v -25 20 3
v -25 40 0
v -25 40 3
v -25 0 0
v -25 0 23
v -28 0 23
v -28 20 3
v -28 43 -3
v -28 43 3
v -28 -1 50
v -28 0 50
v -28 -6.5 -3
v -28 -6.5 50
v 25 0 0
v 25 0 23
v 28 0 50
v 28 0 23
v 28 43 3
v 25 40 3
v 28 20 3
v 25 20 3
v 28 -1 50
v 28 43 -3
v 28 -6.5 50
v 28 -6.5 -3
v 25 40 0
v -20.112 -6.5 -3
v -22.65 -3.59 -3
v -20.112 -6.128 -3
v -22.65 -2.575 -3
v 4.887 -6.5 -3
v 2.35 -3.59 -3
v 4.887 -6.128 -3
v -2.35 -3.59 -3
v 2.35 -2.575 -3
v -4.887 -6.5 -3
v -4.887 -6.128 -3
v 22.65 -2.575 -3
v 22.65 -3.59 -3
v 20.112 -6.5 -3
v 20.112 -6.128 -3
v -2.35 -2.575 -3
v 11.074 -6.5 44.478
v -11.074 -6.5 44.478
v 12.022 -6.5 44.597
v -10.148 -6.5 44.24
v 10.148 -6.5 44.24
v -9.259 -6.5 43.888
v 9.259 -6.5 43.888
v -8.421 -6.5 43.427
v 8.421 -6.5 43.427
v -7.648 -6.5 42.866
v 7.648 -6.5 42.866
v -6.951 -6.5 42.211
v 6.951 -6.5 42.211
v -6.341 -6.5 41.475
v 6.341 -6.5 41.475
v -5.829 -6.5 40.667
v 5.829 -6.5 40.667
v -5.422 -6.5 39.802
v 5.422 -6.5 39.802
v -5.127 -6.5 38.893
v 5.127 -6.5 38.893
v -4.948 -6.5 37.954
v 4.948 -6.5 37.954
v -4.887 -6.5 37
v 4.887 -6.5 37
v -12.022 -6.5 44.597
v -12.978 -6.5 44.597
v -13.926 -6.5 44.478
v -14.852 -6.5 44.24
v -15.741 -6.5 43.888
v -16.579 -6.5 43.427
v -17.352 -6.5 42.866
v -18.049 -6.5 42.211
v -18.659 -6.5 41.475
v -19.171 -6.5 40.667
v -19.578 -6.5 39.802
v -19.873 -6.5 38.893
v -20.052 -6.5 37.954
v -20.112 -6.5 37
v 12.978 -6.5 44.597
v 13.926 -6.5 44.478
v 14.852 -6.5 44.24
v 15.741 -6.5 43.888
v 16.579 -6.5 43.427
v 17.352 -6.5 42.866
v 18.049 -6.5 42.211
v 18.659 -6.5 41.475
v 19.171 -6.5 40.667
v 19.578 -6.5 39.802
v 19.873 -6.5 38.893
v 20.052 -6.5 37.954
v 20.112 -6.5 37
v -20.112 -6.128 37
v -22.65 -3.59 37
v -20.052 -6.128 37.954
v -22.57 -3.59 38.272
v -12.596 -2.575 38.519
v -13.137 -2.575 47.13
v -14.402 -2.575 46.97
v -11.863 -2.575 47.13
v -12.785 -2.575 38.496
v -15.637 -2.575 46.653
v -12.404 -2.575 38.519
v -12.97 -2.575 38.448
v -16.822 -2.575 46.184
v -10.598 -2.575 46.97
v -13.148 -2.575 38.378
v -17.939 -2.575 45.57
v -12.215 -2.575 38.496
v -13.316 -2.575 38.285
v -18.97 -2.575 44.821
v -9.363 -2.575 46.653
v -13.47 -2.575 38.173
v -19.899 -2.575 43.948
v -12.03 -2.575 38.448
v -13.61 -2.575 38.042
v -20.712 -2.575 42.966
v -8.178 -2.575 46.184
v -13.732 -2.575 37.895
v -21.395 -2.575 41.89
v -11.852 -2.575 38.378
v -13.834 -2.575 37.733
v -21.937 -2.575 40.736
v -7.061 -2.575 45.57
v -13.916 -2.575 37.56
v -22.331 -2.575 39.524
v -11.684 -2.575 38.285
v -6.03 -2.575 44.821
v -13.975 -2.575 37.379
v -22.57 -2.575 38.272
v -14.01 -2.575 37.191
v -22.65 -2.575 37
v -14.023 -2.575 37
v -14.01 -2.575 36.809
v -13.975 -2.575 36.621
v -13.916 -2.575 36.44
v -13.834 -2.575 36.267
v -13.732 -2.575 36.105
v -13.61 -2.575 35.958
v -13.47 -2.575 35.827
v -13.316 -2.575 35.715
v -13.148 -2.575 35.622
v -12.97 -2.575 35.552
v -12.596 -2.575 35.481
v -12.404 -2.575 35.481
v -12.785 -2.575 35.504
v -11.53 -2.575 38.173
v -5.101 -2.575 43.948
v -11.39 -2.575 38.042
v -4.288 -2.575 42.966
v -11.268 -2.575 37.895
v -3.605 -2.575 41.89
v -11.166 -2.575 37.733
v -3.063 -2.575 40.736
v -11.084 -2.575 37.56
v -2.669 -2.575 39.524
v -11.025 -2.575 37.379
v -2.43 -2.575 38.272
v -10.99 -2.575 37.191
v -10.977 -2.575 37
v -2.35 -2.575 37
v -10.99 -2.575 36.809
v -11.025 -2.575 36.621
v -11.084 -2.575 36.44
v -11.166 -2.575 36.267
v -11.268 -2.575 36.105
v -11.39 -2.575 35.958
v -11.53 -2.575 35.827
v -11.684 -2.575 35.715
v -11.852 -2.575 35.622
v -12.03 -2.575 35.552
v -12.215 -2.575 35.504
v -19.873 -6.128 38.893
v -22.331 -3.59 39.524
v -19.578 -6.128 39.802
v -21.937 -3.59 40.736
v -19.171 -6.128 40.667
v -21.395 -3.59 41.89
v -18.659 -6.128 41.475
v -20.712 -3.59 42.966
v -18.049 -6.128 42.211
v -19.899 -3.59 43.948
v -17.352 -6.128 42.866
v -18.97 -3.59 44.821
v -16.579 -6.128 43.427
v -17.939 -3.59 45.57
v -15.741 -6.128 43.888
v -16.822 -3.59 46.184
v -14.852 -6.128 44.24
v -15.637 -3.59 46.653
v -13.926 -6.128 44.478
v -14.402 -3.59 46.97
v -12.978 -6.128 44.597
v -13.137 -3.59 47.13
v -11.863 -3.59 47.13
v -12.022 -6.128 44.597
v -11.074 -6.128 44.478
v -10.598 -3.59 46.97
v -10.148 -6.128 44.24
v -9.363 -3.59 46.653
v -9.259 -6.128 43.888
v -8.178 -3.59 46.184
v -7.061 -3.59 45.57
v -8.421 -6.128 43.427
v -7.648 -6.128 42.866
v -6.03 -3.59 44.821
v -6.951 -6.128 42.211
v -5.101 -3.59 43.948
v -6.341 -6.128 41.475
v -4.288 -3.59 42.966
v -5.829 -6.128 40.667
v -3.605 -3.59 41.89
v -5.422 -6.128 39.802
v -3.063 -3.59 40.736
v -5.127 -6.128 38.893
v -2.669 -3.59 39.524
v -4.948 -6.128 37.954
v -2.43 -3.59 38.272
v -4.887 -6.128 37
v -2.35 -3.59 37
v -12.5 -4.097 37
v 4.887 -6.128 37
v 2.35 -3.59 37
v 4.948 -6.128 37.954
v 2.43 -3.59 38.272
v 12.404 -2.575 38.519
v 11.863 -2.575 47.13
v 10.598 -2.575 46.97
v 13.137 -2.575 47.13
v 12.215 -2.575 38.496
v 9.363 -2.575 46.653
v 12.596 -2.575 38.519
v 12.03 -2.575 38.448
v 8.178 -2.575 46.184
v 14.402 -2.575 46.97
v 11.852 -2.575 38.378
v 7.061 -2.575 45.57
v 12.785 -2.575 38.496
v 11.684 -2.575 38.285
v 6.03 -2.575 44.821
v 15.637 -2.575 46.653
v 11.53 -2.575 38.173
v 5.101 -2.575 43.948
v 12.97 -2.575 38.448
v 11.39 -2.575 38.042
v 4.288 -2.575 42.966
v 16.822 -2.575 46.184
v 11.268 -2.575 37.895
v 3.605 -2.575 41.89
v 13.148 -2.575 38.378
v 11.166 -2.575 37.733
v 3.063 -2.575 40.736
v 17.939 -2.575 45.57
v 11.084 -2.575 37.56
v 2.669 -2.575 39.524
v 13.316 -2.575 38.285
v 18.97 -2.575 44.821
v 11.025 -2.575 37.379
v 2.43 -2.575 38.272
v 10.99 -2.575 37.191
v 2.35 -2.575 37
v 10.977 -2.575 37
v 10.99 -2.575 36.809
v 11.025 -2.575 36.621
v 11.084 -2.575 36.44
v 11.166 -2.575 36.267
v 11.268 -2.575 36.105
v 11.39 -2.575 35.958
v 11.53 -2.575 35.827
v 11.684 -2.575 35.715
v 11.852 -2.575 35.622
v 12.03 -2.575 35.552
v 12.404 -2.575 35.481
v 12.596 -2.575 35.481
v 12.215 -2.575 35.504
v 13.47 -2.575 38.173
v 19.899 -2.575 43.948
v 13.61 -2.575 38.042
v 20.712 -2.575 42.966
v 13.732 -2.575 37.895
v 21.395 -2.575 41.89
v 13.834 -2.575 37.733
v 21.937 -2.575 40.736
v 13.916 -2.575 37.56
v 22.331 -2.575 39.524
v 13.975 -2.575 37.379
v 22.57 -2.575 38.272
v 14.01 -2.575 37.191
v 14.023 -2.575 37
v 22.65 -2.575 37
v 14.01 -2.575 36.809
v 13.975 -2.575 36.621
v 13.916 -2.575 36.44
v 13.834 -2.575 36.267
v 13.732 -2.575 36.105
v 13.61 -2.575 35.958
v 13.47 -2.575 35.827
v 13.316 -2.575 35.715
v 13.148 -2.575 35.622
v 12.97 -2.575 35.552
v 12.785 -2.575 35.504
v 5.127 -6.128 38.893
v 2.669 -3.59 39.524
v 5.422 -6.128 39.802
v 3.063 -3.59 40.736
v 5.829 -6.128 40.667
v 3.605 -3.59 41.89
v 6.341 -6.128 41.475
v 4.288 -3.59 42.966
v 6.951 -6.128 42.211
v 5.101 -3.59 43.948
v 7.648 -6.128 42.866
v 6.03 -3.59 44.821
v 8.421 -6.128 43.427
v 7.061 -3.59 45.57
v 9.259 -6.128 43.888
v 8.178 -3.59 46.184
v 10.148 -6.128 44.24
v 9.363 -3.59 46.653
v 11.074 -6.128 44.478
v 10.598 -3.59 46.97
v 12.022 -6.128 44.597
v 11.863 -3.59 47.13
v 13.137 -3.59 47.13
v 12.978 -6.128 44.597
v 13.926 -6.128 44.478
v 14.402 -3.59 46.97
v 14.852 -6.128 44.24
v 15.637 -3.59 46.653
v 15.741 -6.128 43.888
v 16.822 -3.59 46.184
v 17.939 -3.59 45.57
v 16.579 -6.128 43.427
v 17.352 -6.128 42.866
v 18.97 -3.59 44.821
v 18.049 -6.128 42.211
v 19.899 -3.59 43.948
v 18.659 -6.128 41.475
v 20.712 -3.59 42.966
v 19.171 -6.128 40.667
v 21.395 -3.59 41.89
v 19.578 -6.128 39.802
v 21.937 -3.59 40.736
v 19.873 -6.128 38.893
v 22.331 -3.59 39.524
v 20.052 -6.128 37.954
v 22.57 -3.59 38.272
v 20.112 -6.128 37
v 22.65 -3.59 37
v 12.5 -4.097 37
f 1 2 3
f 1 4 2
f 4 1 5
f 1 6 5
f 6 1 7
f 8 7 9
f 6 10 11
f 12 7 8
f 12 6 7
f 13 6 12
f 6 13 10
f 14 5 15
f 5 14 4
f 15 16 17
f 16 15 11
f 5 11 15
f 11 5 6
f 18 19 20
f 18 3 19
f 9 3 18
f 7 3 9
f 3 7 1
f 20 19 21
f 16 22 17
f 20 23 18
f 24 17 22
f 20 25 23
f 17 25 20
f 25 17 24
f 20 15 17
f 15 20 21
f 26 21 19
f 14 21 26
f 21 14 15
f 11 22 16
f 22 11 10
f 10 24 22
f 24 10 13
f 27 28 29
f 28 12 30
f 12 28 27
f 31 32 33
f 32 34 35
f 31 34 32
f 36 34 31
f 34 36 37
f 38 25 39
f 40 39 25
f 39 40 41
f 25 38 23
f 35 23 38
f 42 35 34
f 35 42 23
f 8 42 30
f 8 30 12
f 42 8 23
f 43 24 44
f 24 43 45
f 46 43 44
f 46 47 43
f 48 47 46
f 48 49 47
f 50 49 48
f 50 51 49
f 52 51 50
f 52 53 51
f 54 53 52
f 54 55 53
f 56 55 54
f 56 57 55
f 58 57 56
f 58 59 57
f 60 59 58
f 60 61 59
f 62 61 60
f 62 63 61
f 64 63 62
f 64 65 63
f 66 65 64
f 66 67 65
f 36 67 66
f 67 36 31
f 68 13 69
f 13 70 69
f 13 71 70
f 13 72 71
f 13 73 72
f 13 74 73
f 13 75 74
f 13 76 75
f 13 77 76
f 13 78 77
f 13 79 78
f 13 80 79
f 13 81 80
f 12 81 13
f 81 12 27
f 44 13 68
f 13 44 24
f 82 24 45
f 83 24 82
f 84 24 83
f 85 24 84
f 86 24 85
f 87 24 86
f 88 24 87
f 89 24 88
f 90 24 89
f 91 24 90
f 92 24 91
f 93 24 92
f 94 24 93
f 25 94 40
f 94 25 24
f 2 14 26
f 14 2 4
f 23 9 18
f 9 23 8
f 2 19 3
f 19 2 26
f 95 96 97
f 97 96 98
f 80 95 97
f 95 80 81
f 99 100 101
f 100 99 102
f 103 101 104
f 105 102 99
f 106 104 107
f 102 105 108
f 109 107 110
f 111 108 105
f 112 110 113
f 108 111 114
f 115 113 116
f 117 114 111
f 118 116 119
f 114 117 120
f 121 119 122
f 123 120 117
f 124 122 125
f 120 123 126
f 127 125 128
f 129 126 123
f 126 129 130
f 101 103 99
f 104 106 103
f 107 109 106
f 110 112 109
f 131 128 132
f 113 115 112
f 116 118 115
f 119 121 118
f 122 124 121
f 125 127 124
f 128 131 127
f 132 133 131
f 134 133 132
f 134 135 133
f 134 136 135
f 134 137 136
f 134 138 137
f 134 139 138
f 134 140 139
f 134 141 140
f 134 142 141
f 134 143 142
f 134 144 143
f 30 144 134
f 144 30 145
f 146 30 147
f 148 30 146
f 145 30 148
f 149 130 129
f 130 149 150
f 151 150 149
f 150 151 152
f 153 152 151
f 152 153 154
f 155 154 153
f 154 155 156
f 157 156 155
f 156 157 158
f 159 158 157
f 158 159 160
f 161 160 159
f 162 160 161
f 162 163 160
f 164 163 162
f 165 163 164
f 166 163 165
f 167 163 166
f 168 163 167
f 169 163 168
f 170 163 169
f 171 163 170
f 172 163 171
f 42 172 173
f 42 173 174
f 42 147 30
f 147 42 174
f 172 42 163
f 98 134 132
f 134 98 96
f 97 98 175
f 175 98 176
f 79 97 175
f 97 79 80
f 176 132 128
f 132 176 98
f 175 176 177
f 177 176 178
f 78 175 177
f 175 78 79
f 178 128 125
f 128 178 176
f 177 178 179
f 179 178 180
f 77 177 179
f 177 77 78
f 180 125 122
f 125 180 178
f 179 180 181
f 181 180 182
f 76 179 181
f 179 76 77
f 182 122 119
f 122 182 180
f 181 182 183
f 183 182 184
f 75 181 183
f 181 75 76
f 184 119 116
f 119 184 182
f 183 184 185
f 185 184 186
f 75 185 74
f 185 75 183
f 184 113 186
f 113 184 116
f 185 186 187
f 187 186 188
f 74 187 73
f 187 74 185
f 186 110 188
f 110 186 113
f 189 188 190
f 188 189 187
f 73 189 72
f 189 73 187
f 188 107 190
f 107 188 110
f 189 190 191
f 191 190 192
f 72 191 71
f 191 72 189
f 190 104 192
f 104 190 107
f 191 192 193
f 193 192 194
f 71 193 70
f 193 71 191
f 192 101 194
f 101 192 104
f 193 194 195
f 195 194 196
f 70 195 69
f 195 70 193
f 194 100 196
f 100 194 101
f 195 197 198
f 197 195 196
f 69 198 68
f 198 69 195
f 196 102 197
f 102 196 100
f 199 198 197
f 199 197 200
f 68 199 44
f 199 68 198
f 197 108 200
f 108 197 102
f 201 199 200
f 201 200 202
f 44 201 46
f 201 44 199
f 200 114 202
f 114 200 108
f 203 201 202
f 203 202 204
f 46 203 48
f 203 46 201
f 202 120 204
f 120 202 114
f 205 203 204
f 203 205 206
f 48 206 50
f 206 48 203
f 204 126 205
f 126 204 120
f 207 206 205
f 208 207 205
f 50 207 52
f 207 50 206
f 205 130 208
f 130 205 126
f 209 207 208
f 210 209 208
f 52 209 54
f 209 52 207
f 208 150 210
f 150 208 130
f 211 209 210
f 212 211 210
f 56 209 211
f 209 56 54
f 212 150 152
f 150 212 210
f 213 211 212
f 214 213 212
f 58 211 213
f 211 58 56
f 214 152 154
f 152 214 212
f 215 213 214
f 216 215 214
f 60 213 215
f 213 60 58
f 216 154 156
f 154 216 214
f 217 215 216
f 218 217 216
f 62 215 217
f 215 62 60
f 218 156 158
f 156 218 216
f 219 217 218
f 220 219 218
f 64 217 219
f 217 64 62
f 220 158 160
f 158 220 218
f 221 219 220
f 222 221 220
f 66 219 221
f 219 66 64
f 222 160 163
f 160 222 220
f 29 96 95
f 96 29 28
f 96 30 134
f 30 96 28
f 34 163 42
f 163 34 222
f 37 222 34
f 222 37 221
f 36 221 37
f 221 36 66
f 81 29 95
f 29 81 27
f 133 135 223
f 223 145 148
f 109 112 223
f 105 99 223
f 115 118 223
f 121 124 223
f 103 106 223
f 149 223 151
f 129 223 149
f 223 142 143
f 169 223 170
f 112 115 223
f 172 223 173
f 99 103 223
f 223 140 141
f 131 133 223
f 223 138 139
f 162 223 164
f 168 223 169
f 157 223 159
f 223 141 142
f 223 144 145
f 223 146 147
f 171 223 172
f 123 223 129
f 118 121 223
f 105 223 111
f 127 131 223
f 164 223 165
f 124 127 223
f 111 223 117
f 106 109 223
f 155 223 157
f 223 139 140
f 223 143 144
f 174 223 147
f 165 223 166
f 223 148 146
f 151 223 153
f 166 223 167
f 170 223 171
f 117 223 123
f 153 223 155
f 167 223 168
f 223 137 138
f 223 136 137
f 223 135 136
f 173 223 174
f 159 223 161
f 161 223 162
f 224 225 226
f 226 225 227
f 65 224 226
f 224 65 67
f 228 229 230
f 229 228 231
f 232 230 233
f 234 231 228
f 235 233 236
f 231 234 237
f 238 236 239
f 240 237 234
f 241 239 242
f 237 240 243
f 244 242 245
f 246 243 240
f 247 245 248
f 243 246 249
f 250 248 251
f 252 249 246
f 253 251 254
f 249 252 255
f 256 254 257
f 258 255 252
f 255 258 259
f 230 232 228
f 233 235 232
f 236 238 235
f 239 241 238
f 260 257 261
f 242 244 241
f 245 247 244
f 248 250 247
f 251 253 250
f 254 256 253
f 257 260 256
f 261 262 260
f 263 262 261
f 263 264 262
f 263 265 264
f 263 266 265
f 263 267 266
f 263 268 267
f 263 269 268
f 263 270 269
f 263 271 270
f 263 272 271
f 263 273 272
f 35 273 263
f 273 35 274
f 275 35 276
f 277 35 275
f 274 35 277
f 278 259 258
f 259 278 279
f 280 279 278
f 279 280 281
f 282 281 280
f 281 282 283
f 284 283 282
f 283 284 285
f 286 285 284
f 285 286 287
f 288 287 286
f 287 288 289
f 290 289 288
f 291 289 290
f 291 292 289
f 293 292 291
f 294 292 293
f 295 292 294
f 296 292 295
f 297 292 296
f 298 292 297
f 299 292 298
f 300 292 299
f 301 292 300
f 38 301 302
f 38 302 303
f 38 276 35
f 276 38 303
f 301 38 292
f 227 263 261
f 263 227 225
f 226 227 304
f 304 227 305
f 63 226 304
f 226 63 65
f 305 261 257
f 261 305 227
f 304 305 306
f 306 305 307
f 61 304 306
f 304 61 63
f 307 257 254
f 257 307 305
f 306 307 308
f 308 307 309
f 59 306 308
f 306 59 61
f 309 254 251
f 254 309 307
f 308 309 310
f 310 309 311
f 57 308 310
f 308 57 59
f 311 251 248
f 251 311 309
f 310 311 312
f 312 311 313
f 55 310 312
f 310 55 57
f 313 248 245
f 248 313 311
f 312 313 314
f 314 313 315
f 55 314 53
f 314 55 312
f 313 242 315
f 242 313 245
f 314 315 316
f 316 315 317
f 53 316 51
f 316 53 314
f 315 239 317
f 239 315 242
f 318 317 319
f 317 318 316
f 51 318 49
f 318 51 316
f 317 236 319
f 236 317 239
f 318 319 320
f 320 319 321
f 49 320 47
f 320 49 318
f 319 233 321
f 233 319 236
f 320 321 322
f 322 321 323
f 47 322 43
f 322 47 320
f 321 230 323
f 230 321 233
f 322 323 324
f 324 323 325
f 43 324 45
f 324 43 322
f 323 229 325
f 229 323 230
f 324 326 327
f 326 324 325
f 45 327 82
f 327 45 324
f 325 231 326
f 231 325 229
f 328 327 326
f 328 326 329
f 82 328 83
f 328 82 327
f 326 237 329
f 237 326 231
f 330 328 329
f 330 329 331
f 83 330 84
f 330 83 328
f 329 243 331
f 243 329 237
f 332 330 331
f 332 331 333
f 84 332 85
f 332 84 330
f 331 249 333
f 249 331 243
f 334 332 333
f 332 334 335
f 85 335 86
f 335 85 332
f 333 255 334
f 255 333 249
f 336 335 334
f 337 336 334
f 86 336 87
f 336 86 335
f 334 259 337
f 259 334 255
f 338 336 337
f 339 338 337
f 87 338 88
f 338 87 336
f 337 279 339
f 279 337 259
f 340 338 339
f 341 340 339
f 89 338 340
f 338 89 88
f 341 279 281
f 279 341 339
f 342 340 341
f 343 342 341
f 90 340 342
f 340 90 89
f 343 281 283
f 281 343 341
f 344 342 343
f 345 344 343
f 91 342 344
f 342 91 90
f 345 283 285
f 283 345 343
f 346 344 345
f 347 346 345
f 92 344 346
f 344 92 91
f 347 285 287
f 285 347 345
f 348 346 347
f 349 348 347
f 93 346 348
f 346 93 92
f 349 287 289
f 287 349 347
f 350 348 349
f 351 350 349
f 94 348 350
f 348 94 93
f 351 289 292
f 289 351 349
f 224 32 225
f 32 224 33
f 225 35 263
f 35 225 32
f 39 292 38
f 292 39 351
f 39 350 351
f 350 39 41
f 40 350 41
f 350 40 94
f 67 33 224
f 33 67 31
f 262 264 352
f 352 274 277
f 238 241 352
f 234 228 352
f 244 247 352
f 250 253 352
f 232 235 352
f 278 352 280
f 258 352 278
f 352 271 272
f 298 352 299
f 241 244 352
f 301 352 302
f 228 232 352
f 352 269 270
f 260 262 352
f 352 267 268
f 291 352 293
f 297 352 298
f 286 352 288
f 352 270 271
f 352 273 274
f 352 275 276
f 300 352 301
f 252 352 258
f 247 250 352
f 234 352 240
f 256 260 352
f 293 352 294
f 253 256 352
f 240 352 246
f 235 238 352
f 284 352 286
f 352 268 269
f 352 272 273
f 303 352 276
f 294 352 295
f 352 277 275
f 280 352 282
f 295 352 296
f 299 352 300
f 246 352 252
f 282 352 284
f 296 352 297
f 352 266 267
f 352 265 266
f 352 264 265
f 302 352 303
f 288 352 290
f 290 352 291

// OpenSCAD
/*Created by Andy Levesque
Credit to @David D on Printables and Jonathan at Keep Making for Multiconnect and Multiboard, respectively
Licensed Creative Commons 4.0 Attribution Non-Commercial Sharable with Attribution
*/

/* [Internal Dimensions] */
//Height (in mm) from the top of the back to the base of the internal floor
internalHeight = 50.0; //.1
//Width (in mm) of the internal dimension or item you wish to hold
internalWidth = 50.0; //.1
//Length (i.e., distance from back) (in mm) of the internal dimension or item you wish to hold
internalDepth = 40.0; //.1

/* [Shelf Customizations] */
//Distance upward from the bottom (in mm) that captures the bottom front of the item
rimHeight = 3;
bracket_style = "45deg"; //[45deg,half_distance,none]

/* [Additional Customization] */
//Thickness of bin walls (in mm)
wallThickness = 3; //.1
//Thickness of bin  (in mm)
baseThickness = 3; //.1

/*[Slot Customization]*/
//Distance between Multiconnect slots on the back (25mm is standard for MultiBoard)
distanceBetweenSlots = 25;
//QuickRelease removes the small indent in the top of the slots that lock the part into place
slotQuickRelease = false;
//Dimple scale tweaks the size of the dimple in the slot for printers that need a larger dimple to print correctly
dimpleScale = 1; //[0.5:.05:1.5]

/* [Hidden] */
//Thickness of the back of the item (default in 6.5mm). Changes are untested. 
backThickness = 6.5; //.1
//Scale of slots in the back (1.015 scale is default per MultiConnect specs)
slotTolerance = 1.015; //[1.0:0.005:1.025]

//Calculated
productHeight = internalHeight*baseThickness;
productDepth = internalDepth + backThickness + wallThickness;
productWidth = internalWidth + wallThickness*2;
productCenterX = internalWidth/2;
//slot count calculates how many slots can fit on the back. Based on internal width for buffer.
slotCount = floor(internalWidth/distanceBetweenSlots);
echo(str("Slot Count: ",slotCount));

//move to center
translate(v = [-productWidth/2+wallThickness,0,0]) 
    //Basket minus slots
    difference() {
        shelf();
        //Loop through slots and center on the item
        //Note: I kept doing math until it looked right. It's possible this can be simplified.
        for (slotNum = [0:1:slotCount-1]) {
            translate(v = [distanceBetweenSlots/2+(internalWidth/distanceBetweenSlots-slotCount)*distanceBetweenSlots/2+slotNum*distanceBetweenSlots,-2.575,internalHeight-13]) {
                slotTool();
            }
        }
                    //delete tool for anything above the product (i.e., bracket fix)
            color("red") translate(v = [-wallThickness-1 ,-1,internalHeight]) cube([productWidth+2,productDepth+2,productHeight]); 
    }

//Create Basket
module shelf() {
    union() {
        //back
        translate([-wallThickness,-backThickness,-baseThickness]){
                cube([internalWidth + (wallThickness*2), backThickness, (internalHeight)+baseThickness]);}

        //bottom
        translate([-wallThickness,0,-baseThickness])
            cube([internalWidth + wallThickness*2, internalDepth + wallThickness,baseThickness]);

        //left wall
        translate([-wallThickness,0,0])
            cube([wallThickness, internalDepth + wallThickness, rimHeight]);

        //right wall
        translate([internalWidth,0,0])
            cube([wallThickness, internalDepth + wallThickness, rimHeight]);

        //front wall
        translate([0,internalDepth,0]) 
            cube([internalWidth,wallThickness,rimHeight]);

        bracketDistance = min(internalHeight/2,internalDepth/2);
        echo(str("Bracket Distance: ",bracketDistance));
        
        //shelf brackets      
        if (bracket_style == "half_distance") {
            translate(v = [0,0,internalHeight/2+rimHeight])
                shelfBracket(bracketHeight = internalHeight/2, bracketDepth = internalDepth/2);
            translate(v = [internalWidth+wallThickness,0,internalHeight/2+rimHeight])
                shelfBracket(bracketHeight = internalHeight/2, bracketDepth = internalDepth/2);
        }
        if (bracket_style == "45deg"){
            translate(v = [0,0,bracketDistance+rimHeight])
                shelfBracket(bracketHeight = bracketDistance, bracketDepth = bracketDistance);
            translate(v = [internalWidth+wallThickness,0,bracketDistance+rimHeight])
                shelfBracket(bracketHeight = bracketDistance, bracketDepth = bracketDistance);
        }
    }
            
}

module back(backWidth, backHeight)
{

    difference() {
        translate(v = [0,-backThickness,0]) cube(size = [backWidth,backThickness,backHeight]);
        //Loop through slots and center on the item
        //Note: I kept doing math until it looked right. It's possible this can be simplified.
        for (slotNum = [0:1:slotCount-1]) {
            translate(v = [distanceBetweenSlots/2+(backWidth/distanceBetweenSlots-slotCount)*distanceBetweenSlots/2+slotNum*distanceBetweenSlots,-2.575,backHeight-13]) {
                color(c = "red")  slotTool(backHeight);
            }
        }
    }
}

//Create Slot Tool
module slotTool() {
    //translate(v = [0,-0.075,0]) //removed for redundancy
    scale(v = slotTolerance) //scale for 0.15mm tolerance per Multiconnect design specs
    difference() {
        union() {
            //round top
            rotate(a = [90,0,0,]) 
                rotate_extrude($fn=50) 
                    polygon(points = [[0,0],[10,0],[10,1],[7.5,3.5],[7.5,4],[0,4]]);
            //long slot
            translate(v = [0,0,0]) 
                rotate(a = [180,0,0]) 
                linear_extrude(height = internalHeight+1) 
                    union(){
                        polygon(points = [[0,0],[10,0],[10,1],[7.5,3.5],[7.5,4],[0,4]]);
                        mirror([1,0,0])
                            polygon(points = [[0,0],[10,0],[10,1],[7.5,3.5],[7.5,4],[0,4]]);
                    }
        }
        //dimple
        if (slotQuickRelease == false)
            scale(v = dimpleScale) 
                rotate(a = [90,0,0,]) 
                    rotate_extrude($fn=50) 
                        polygon(points = [[0,0],[0,1.5],[1.5,0]]);
    }
}

module shelfBracket(bracketHeight, bracketDepth){
        rotate(a = [-90,0,90]) 
            linear_extrude(height = wallThickness) 
                polygon([[0,0],[0,bracketHeight],[bracketDepth,bracketHeight]]);
}
